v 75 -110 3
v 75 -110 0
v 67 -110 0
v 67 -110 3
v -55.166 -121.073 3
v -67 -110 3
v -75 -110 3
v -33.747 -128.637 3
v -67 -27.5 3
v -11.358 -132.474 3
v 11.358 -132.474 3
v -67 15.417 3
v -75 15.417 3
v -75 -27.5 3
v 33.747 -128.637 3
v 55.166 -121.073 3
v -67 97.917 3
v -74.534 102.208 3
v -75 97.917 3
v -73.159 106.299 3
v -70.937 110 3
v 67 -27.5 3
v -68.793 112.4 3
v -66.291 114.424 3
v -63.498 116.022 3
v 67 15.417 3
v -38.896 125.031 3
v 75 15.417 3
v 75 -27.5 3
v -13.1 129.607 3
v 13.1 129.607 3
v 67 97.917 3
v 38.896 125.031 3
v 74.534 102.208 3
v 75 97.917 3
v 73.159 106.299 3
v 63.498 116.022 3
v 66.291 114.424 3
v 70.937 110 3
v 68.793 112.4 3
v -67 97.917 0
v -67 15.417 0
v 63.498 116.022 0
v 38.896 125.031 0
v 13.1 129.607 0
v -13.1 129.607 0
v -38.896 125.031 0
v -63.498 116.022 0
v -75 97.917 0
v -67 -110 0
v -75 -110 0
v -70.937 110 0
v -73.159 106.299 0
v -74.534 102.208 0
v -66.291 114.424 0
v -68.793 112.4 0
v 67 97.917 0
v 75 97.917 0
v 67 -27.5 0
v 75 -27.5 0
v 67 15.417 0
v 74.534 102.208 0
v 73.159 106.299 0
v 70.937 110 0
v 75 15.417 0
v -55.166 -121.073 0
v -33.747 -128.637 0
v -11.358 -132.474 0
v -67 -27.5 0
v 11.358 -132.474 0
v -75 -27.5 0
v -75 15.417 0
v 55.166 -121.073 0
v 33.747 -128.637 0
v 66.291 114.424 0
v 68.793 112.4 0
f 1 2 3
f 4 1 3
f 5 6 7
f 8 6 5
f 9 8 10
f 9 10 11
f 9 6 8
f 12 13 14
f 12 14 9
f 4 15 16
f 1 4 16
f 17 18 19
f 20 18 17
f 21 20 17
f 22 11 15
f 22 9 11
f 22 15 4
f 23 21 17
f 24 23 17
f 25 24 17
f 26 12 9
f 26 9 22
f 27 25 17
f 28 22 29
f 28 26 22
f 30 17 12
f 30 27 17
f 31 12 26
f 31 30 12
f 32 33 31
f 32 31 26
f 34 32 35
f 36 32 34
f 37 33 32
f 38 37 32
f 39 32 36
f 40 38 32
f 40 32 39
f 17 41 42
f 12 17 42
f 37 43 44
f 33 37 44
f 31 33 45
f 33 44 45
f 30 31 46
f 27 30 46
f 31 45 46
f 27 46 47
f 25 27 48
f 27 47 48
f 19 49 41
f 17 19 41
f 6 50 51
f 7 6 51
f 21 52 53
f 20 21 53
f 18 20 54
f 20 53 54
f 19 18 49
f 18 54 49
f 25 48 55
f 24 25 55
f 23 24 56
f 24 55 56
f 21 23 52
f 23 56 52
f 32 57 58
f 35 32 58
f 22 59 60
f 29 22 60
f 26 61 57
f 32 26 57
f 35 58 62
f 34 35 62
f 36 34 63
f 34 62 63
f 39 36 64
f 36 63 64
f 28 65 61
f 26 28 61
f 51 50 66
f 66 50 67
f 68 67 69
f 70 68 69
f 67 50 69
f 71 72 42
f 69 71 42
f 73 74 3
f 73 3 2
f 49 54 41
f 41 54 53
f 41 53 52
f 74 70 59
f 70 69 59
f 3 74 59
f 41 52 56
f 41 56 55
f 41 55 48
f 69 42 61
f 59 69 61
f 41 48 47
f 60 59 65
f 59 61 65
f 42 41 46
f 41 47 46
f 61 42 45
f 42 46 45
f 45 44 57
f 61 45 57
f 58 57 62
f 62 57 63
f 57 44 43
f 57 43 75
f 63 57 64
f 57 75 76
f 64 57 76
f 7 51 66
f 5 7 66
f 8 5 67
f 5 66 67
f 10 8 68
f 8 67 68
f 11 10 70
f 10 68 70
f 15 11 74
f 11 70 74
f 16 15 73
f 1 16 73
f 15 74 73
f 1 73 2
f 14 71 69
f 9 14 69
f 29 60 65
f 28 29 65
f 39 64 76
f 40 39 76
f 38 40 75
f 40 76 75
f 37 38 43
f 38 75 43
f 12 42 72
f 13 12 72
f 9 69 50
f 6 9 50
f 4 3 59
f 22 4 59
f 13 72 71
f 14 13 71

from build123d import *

# Parameters (mm, degrees)
F1_DEPTH = 3


with BuildPart() as f1:
    # F0 (on Top) → F1 (new body)
    with BuildSketch(Plane.XY):
        with BuildLine():
            ThreePointArc((-75, -110), (0, -132.956233), (75, -110))
            Line((75, -110), (67, -110))
            Line((67, -110), (67, -27.5))
            Line((67, -27.5), (75, -27.5))
            Line((75, -27.5), (75, 15.416617))
            Line((75, 15.416617), (67, 15.416617))
            Line((67, 15.416617), (67, 97.916617))
            Line((67, 97.916617), (75, 97.916617))
            ThreePointArc((75, 97.916617), (73.957089, 104.290688), (70.937122, 110))
            ThreePointArc((70.937122, 110), (67.582857, 113.462411), (63.497547, 116.021636))
            ThreePointArc((63.497547, 116.021636), (0, 130.181802), (-63.497547, 116.021636))
            ThreePointArc((-63.497547, 116.021636), (-67.582857, 113.462411), (-70.937122, 110))
            ThreePointArc((-70.937122, 110), (-73.957089, 104.290688), (-75, 97.916617))
            Line((-75, 97.916617), (-67, 97.916617))
            Line((-67, 97.916617), (-67, 15.416617))
            Line((-67, 15.416617), (-75, 15.416617))
            Line((-75, 15.416617), (-75, -27.5))
            Line((-75, -27.5), (-67, -27.5))
            Line((-67, -27.5), (-67, -110))
            Line((-67, -110), (-75, -110))
        make_face()
    extrude(amount=F1_DEPTH)


solid = f1.part
